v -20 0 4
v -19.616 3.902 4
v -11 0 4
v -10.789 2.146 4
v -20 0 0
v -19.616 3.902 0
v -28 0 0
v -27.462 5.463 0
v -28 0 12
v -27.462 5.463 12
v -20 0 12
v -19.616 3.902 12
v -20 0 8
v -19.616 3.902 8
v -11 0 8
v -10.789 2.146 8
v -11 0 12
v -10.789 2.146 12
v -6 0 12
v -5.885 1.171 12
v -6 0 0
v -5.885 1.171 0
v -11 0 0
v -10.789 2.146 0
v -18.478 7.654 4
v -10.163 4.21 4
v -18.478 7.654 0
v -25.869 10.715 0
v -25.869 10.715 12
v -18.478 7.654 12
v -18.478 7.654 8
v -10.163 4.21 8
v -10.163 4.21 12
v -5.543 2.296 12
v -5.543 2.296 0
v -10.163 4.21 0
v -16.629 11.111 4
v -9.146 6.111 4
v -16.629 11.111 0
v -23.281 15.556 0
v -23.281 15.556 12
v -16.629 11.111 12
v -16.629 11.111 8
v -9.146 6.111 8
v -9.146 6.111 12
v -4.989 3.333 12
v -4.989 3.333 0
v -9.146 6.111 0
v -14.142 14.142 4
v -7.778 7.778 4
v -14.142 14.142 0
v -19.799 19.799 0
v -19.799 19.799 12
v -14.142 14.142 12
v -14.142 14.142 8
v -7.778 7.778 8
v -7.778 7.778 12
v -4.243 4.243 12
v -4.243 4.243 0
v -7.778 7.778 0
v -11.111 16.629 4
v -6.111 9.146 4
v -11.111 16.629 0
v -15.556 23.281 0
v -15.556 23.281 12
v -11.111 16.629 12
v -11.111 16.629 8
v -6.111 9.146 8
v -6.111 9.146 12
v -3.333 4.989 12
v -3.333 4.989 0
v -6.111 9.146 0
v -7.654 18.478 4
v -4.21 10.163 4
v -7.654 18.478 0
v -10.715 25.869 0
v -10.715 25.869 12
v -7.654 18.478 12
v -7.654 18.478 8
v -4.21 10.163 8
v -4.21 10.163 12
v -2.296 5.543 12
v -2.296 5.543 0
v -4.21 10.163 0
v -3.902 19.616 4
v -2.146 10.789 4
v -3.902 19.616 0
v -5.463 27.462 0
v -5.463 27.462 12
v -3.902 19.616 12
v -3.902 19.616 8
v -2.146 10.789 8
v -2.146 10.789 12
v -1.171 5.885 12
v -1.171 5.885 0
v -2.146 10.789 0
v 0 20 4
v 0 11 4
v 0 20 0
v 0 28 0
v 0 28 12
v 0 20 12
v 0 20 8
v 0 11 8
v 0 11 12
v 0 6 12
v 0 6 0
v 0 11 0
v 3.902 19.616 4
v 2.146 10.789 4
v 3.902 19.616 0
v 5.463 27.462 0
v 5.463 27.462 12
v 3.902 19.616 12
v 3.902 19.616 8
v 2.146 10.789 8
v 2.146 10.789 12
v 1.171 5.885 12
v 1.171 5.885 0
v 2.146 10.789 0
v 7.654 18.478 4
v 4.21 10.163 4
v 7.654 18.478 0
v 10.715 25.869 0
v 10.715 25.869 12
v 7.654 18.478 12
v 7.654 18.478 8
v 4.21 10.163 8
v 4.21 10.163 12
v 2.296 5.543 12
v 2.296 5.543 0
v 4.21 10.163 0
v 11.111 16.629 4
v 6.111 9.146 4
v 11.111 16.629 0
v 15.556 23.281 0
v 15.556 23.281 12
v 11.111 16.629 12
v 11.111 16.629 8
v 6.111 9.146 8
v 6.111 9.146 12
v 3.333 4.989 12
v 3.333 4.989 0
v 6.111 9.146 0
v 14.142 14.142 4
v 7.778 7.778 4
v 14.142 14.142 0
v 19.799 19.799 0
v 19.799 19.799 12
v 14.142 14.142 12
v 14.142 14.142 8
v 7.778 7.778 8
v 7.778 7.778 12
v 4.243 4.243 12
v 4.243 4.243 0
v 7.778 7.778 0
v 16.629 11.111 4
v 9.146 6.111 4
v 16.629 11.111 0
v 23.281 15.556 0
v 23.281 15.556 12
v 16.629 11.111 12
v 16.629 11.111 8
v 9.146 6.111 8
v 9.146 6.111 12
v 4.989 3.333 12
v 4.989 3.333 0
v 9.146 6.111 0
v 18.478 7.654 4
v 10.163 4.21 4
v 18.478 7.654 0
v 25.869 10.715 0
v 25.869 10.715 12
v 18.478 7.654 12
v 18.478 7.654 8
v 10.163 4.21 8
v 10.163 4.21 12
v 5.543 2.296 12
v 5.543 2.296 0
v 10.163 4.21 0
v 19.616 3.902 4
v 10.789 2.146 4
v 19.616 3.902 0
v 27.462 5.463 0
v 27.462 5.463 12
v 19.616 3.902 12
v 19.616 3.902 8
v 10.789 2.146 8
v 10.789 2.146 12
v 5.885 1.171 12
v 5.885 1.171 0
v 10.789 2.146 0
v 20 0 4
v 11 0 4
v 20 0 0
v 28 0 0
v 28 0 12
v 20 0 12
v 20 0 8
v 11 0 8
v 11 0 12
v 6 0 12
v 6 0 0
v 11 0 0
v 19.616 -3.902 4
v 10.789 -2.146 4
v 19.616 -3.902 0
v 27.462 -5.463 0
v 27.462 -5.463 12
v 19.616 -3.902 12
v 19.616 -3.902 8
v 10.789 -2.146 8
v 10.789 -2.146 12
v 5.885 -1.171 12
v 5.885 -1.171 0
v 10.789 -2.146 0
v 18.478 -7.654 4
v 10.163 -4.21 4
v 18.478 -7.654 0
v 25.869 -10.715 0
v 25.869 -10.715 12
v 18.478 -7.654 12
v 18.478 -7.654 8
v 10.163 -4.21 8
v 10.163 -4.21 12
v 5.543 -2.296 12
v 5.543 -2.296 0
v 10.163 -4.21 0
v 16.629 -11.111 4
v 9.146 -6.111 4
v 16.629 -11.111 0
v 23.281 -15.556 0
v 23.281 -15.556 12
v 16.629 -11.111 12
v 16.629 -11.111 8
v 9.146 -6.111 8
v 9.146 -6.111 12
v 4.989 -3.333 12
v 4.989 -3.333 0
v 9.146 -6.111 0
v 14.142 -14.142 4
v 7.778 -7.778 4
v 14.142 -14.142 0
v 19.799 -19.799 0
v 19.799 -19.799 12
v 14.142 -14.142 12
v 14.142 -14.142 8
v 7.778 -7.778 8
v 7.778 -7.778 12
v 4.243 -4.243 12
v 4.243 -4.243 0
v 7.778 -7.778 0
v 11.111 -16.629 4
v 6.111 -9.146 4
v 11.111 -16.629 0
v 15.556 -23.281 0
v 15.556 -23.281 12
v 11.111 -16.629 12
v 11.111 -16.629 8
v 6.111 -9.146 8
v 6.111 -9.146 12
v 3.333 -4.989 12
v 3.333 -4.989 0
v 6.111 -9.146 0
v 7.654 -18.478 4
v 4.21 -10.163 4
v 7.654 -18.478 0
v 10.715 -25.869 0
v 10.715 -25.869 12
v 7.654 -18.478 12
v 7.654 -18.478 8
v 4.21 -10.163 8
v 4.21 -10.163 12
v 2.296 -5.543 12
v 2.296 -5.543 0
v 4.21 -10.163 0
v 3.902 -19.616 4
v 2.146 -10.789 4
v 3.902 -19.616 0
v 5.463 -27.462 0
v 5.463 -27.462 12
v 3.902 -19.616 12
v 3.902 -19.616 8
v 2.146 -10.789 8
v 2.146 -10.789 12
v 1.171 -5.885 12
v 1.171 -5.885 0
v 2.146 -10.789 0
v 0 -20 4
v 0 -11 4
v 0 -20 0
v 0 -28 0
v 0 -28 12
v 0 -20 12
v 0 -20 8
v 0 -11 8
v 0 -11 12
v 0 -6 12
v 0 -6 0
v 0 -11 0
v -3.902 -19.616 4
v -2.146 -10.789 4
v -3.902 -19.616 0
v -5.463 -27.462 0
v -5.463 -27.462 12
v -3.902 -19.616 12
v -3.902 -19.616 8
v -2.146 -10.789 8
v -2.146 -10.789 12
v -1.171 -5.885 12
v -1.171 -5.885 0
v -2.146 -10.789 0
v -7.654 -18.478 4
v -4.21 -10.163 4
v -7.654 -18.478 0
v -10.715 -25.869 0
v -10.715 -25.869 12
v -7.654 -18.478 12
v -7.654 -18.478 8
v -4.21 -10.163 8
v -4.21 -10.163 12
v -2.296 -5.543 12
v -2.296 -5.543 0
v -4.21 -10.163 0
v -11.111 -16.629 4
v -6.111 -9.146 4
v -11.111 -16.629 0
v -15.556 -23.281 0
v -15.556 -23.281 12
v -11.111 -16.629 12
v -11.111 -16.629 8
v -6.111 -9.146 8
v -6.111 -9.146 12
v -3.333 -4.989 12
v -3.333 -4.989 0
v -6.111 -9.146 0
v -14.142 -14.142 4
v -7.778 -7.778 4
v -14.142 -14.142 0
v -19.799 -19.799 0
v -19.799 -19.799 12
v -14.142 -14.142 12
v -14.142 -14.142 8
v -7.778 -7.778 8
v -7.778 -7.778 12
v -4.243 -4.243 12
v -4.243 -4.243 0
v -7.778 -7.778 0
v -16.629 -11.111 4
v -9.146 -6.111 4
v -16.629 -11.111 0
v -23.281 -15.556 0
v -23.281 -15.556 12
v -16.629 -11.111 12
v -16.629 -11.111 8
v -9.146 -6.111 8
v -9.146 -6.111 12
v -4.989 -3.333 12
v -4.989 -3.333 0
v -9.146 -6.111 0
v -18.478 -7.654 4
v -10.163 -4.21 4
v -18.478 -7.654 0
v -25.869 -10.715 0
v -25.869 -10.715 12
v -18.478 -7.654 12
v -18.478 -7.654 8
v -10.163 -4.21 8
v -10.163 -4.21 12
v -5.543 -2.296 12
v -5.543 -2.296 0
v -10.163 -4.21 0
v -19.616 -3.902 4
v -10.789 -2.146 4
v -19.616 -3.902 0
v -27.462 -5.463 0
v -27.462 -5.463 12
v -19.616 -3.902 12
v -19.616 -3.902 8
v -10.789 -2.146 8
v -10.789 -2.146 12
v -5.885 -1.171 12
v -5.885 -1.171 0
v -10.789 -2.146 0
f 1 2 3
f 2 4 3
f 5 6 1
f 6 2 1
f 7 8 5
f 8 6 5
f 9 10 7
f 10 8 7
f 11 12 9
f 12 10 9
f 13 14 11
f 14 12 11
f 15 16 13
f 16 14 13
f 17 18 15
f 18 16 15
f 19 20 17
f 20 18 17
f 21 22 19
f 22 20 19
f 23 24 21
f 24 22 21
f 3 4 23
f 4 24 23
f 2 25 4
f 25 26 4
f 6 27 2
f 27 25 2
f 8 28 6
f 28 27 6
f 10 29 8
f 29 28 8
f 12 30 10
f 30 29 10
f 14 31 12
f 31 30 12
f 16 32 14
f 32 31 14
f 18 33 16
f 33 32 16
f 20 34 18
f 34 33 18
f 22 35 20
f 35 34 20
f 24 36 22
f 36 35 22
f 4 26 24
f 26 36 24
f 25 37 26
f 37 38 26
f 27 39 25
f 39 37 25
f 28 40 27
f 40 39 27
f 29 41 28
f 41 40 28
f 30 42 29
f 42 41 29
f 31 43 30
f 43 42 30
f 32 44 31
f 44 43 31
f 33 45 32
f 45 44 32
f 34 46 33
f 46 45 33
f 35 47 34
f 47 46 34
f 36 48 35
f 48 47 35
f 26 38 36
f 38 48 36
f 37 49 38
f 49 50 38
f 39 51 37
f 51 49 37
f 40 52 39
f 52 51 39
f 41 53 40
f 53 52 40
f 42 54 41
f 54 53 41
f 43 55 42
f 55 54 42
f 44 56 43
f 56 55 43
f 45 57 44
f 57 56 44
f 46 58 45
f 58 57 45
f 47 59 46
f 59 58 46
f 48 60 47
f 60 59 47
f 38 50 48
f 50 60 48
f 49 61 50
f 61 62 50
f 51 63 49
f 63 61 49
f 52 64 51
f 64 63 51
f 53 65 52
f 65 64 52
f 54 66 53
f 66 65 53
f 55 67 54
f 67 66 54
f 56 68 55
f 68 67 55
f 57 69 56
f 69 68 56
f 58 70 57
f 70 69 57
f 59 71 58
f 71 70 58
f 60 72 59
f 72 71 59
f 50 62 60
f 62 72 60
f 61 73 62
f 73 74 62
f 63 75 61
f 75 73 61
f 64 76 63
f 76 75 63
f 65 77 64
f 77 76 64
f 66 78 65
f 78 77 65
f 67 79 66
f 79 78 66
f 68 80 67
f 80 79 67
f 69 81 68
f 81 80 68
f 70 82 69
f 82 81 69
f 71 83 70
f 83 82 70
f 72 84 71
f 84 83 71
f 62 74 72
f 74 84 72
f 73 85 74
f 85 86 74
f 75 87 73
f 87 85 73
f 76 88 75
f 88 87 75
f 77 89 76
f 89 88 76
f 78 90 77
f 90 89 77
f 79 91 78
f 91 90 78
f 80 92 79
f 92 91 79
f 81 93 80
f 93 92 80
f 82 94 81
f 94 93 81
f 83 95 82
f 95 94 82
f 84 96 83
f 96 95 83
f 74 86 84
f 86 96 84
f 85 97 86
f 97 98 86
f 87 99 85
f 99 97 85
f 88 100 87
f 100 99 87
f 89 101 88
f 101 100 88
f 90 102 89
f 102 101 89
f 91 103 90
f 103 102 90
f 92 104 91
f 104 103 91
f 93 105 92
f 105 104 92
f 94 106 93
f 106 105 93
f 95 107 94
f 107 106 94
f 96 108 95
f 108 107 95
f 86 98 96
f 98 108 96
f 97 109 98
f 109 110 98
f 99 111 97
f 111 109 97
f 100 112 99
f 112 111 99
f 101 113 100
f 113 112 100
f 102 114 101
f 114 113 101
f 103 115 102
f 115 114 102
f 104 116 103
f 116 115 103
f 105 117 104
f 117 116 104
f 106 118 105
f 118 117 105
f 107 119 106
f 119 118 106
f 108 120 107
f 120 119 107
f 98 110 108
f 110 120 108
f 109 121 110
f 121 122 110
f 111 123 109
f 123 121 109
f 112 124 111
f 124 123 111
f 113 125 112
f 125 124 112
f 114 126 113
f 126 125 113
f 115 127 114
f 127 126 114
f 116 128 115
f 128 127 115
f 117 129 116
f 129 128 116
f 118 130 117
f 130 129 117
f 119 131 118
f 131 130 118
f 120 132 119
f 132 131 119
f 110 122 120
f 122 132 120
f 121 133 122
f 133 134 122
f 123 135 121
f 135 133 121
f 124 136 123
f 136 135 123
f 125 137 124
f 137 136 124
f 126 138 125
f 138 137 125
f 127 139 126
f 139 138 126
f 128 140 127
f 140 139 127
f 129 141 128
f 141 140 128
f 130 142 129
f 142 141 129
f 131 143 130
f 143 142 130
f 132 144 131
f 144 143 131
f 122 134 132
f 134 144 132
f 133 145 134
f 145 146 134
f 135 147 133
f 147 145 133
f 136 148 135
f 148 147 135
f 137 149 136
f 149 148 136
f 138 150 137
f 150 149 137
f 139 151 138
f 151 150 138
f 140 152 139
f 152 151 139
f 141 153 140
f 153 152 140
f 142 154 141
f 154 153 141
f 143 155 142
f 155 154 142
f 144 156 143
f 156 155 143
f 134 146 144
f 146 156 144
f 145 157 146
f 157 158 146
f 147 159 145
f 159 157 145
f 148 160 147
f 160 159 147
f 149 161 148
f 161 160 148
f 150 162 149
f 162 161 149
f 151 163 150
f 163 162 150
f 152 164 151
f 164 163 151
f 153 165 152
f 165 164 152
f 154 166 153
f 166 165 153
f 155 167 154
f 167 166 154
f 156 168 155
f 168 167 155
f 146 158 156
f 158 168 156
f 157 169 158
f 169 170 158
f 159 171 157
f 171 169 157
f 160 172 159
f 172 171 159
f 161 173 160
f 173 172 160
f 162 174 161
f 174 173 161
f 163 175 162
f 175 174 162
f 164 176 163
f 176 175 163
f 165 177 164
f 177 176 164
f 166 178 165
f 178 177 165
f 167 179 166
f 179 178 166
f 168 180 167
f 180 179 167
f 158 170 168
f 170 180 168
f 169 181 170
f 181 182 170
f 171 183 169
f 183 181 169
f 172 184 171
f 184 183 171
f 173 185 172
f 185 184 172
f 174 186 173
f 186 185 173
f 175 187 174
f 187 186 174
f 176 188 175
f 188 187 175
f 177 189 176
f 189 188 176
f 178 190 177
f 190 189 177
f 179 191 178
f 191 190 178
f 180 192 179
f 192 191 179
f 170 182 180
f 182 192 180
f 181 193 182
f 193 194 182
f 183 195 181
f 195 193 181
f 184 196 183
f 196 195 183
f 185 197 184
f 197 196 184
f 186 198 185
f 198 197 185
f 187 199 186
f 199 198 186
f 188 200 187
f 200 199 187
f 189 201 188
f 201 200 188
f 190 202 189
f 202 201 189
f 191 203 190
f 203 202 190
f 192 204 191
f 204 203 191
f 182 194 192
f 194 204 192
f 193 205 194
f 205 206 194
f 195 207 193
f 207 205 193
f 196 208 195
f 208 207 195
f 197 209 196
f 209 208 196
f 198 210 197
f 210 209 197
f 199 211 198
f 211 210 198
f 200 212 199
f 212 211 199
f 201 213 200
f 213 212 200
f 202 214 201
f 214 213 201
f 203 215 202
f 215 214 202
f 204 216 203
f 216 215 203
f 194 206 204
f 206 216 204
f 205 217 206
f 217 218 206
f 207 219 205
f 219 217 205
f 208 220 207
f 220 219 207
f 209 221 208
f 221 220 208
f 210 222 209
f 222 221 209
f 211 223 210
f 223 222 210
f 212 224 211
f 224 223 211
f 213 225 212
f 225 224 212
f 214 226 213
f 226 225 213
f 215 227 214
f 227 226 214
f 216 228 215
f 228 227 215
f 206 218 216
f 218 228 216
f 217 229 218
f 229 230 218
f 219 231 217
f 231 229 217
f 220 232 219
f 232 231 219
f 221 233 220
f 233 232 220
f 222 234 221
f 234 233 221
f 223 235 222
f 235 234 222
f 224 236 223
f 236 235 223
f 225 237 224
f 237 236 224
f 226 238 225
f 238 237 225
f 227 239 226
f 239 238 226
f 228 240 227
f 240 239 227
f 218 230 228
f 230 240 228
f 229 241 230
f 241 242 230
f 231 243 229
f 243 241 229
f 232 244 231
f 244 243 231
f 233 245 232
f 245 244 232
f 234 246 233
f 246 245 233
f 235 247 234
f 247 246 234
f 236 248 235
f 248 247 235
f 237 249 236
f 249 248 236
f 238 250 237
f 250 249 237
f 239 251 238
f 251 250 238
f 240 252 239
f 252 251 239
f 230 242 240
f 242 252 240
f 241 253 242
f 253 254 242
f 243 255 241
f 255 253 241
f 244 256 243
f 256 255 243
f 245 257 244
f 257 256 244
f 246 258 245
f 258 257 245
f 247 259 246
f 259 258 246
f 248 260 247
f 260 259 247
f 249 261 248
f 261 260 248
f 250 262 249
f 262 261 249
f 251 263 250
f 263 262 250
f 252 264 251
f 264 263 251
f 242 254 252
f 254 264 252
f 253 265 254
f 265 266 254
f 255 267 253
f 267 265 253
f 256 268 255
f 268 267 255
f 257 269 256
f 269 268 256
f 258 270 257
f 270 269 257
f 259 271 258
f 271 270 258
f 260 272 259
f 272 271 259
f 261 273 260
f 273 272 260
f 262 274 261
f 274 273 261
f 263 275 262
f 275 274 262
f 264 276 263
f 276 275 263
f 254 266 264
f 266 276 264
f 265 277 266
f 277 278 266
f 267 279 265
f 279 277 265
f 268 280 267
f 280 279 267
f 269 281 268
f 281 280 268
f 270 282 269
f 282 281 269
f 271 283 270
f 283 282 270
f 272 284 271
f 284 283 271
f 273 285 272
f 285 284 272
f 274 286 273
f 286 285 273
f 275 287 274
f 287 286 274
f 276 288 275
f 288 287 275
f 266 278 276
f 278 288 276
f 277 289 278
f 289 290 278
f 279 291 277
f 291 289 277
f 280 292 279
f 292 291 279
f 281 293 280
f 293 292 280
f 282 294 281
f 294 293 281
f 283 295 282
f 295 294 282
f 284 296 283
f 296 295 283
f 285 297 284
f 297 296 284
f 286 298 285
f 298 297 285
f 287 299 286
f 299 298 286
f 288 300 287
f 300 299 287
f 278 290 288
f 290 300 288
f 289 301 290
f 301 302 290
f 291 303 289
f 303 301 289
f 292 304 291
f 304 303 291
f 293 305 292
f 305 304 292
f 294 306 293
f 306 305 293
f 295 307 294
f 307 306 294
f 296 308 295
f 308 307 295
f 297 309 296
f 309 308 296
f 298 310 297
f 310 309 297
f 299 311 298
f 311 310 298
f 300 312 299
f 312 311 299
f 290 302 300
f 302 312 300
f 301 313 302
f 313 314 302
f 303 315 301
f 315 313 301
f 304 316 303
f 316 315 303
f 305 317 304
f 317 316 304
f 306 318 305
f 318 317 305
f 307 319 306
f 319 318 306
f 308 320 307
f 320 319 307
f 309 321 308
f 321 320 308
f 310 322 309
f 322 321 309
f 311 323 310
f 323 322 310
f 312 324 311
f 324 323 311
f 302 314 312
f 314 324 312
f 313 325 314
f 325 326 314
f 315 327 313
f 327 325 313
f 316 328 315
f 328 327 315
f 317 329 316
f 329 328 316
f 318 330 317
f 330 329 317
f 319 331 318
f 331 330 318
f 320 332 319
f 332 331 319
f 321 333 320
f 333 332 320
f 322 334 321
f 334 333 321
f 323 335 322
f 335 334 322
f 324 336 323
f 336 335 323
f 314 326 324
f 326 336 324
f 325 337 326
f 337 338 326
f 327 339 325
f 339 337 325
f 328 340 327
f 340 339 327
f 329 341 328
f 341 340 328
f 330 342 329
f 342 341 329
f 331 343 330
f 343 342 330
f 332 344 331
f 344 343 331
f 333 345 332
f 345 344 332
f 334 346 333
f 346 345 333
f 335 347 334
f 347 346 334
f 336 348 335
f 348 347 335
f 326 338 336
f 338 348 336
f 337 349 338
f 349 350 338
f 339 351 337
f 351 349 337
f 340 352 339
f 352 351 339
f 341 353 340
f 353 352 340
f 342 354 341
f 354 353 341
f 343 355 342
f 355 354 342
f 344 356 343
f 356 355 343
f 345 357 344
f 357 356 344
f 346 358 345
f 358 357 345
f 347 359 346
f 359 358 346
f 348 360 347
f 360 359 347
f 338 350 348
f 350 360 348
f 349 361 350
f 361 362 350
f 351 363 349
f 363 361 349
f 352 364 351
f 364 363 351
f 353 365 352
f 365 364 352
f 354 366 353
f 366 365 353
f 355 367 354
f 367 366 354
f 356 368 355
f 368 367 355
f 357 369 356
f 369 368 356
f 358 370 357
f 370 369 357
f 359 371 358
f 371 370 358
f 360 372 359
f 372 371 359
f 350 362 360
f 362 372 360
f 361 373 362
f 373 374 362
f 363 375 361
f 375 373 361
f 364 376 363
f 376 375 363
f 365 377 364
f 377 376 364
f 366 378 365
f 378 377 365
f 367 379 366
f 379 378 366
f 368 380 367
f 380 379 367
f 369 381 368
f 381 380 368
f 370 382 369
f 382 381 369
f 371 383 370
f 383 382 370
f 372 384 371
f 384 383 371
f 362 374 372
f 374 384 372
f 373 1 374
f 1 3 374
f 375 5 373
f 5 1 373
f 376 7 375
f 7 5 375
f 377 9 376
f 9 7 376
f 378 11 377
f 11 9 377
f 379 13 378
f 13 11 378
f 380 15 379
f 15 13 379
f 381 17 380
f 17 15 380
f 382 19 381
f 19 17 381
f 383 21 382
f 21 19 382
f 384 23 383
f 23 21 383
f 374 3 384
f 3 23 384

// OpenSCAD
$fn = 32;

// ----------------------------------------------------------------------
// Revolved part: handwheel R28
// ----------------------------------------------------------------------

// --- parameters (mm) ---
bore_r = 6;               // bore radius
rim_r = 28;               // rim radius
rim_w = 8;                // rim axial width
rim_t = 12;               // rim diameter height
hub_r = 11;               // hub radius
web_t = 4;                // web thickness
revolve_angle = 360;      // revolve sweep, degrees

bore_d = 2 * bore_r;
rim_d = 2 * rim_r;
hub_d = 2 * hub_r;

profile = [[6, 0], [11, 0], [11, 4], [20, 4], [20, 0], [28, 0], [28, 12], [20, 12], [20, 8], [11, 8], [11, 12], [6, 12]];  // primary outline, 12 points, counter clockwise

// --- the one profile operation ---
rotate_extrude(angle = revolve_angle) polygon(points = profile);
